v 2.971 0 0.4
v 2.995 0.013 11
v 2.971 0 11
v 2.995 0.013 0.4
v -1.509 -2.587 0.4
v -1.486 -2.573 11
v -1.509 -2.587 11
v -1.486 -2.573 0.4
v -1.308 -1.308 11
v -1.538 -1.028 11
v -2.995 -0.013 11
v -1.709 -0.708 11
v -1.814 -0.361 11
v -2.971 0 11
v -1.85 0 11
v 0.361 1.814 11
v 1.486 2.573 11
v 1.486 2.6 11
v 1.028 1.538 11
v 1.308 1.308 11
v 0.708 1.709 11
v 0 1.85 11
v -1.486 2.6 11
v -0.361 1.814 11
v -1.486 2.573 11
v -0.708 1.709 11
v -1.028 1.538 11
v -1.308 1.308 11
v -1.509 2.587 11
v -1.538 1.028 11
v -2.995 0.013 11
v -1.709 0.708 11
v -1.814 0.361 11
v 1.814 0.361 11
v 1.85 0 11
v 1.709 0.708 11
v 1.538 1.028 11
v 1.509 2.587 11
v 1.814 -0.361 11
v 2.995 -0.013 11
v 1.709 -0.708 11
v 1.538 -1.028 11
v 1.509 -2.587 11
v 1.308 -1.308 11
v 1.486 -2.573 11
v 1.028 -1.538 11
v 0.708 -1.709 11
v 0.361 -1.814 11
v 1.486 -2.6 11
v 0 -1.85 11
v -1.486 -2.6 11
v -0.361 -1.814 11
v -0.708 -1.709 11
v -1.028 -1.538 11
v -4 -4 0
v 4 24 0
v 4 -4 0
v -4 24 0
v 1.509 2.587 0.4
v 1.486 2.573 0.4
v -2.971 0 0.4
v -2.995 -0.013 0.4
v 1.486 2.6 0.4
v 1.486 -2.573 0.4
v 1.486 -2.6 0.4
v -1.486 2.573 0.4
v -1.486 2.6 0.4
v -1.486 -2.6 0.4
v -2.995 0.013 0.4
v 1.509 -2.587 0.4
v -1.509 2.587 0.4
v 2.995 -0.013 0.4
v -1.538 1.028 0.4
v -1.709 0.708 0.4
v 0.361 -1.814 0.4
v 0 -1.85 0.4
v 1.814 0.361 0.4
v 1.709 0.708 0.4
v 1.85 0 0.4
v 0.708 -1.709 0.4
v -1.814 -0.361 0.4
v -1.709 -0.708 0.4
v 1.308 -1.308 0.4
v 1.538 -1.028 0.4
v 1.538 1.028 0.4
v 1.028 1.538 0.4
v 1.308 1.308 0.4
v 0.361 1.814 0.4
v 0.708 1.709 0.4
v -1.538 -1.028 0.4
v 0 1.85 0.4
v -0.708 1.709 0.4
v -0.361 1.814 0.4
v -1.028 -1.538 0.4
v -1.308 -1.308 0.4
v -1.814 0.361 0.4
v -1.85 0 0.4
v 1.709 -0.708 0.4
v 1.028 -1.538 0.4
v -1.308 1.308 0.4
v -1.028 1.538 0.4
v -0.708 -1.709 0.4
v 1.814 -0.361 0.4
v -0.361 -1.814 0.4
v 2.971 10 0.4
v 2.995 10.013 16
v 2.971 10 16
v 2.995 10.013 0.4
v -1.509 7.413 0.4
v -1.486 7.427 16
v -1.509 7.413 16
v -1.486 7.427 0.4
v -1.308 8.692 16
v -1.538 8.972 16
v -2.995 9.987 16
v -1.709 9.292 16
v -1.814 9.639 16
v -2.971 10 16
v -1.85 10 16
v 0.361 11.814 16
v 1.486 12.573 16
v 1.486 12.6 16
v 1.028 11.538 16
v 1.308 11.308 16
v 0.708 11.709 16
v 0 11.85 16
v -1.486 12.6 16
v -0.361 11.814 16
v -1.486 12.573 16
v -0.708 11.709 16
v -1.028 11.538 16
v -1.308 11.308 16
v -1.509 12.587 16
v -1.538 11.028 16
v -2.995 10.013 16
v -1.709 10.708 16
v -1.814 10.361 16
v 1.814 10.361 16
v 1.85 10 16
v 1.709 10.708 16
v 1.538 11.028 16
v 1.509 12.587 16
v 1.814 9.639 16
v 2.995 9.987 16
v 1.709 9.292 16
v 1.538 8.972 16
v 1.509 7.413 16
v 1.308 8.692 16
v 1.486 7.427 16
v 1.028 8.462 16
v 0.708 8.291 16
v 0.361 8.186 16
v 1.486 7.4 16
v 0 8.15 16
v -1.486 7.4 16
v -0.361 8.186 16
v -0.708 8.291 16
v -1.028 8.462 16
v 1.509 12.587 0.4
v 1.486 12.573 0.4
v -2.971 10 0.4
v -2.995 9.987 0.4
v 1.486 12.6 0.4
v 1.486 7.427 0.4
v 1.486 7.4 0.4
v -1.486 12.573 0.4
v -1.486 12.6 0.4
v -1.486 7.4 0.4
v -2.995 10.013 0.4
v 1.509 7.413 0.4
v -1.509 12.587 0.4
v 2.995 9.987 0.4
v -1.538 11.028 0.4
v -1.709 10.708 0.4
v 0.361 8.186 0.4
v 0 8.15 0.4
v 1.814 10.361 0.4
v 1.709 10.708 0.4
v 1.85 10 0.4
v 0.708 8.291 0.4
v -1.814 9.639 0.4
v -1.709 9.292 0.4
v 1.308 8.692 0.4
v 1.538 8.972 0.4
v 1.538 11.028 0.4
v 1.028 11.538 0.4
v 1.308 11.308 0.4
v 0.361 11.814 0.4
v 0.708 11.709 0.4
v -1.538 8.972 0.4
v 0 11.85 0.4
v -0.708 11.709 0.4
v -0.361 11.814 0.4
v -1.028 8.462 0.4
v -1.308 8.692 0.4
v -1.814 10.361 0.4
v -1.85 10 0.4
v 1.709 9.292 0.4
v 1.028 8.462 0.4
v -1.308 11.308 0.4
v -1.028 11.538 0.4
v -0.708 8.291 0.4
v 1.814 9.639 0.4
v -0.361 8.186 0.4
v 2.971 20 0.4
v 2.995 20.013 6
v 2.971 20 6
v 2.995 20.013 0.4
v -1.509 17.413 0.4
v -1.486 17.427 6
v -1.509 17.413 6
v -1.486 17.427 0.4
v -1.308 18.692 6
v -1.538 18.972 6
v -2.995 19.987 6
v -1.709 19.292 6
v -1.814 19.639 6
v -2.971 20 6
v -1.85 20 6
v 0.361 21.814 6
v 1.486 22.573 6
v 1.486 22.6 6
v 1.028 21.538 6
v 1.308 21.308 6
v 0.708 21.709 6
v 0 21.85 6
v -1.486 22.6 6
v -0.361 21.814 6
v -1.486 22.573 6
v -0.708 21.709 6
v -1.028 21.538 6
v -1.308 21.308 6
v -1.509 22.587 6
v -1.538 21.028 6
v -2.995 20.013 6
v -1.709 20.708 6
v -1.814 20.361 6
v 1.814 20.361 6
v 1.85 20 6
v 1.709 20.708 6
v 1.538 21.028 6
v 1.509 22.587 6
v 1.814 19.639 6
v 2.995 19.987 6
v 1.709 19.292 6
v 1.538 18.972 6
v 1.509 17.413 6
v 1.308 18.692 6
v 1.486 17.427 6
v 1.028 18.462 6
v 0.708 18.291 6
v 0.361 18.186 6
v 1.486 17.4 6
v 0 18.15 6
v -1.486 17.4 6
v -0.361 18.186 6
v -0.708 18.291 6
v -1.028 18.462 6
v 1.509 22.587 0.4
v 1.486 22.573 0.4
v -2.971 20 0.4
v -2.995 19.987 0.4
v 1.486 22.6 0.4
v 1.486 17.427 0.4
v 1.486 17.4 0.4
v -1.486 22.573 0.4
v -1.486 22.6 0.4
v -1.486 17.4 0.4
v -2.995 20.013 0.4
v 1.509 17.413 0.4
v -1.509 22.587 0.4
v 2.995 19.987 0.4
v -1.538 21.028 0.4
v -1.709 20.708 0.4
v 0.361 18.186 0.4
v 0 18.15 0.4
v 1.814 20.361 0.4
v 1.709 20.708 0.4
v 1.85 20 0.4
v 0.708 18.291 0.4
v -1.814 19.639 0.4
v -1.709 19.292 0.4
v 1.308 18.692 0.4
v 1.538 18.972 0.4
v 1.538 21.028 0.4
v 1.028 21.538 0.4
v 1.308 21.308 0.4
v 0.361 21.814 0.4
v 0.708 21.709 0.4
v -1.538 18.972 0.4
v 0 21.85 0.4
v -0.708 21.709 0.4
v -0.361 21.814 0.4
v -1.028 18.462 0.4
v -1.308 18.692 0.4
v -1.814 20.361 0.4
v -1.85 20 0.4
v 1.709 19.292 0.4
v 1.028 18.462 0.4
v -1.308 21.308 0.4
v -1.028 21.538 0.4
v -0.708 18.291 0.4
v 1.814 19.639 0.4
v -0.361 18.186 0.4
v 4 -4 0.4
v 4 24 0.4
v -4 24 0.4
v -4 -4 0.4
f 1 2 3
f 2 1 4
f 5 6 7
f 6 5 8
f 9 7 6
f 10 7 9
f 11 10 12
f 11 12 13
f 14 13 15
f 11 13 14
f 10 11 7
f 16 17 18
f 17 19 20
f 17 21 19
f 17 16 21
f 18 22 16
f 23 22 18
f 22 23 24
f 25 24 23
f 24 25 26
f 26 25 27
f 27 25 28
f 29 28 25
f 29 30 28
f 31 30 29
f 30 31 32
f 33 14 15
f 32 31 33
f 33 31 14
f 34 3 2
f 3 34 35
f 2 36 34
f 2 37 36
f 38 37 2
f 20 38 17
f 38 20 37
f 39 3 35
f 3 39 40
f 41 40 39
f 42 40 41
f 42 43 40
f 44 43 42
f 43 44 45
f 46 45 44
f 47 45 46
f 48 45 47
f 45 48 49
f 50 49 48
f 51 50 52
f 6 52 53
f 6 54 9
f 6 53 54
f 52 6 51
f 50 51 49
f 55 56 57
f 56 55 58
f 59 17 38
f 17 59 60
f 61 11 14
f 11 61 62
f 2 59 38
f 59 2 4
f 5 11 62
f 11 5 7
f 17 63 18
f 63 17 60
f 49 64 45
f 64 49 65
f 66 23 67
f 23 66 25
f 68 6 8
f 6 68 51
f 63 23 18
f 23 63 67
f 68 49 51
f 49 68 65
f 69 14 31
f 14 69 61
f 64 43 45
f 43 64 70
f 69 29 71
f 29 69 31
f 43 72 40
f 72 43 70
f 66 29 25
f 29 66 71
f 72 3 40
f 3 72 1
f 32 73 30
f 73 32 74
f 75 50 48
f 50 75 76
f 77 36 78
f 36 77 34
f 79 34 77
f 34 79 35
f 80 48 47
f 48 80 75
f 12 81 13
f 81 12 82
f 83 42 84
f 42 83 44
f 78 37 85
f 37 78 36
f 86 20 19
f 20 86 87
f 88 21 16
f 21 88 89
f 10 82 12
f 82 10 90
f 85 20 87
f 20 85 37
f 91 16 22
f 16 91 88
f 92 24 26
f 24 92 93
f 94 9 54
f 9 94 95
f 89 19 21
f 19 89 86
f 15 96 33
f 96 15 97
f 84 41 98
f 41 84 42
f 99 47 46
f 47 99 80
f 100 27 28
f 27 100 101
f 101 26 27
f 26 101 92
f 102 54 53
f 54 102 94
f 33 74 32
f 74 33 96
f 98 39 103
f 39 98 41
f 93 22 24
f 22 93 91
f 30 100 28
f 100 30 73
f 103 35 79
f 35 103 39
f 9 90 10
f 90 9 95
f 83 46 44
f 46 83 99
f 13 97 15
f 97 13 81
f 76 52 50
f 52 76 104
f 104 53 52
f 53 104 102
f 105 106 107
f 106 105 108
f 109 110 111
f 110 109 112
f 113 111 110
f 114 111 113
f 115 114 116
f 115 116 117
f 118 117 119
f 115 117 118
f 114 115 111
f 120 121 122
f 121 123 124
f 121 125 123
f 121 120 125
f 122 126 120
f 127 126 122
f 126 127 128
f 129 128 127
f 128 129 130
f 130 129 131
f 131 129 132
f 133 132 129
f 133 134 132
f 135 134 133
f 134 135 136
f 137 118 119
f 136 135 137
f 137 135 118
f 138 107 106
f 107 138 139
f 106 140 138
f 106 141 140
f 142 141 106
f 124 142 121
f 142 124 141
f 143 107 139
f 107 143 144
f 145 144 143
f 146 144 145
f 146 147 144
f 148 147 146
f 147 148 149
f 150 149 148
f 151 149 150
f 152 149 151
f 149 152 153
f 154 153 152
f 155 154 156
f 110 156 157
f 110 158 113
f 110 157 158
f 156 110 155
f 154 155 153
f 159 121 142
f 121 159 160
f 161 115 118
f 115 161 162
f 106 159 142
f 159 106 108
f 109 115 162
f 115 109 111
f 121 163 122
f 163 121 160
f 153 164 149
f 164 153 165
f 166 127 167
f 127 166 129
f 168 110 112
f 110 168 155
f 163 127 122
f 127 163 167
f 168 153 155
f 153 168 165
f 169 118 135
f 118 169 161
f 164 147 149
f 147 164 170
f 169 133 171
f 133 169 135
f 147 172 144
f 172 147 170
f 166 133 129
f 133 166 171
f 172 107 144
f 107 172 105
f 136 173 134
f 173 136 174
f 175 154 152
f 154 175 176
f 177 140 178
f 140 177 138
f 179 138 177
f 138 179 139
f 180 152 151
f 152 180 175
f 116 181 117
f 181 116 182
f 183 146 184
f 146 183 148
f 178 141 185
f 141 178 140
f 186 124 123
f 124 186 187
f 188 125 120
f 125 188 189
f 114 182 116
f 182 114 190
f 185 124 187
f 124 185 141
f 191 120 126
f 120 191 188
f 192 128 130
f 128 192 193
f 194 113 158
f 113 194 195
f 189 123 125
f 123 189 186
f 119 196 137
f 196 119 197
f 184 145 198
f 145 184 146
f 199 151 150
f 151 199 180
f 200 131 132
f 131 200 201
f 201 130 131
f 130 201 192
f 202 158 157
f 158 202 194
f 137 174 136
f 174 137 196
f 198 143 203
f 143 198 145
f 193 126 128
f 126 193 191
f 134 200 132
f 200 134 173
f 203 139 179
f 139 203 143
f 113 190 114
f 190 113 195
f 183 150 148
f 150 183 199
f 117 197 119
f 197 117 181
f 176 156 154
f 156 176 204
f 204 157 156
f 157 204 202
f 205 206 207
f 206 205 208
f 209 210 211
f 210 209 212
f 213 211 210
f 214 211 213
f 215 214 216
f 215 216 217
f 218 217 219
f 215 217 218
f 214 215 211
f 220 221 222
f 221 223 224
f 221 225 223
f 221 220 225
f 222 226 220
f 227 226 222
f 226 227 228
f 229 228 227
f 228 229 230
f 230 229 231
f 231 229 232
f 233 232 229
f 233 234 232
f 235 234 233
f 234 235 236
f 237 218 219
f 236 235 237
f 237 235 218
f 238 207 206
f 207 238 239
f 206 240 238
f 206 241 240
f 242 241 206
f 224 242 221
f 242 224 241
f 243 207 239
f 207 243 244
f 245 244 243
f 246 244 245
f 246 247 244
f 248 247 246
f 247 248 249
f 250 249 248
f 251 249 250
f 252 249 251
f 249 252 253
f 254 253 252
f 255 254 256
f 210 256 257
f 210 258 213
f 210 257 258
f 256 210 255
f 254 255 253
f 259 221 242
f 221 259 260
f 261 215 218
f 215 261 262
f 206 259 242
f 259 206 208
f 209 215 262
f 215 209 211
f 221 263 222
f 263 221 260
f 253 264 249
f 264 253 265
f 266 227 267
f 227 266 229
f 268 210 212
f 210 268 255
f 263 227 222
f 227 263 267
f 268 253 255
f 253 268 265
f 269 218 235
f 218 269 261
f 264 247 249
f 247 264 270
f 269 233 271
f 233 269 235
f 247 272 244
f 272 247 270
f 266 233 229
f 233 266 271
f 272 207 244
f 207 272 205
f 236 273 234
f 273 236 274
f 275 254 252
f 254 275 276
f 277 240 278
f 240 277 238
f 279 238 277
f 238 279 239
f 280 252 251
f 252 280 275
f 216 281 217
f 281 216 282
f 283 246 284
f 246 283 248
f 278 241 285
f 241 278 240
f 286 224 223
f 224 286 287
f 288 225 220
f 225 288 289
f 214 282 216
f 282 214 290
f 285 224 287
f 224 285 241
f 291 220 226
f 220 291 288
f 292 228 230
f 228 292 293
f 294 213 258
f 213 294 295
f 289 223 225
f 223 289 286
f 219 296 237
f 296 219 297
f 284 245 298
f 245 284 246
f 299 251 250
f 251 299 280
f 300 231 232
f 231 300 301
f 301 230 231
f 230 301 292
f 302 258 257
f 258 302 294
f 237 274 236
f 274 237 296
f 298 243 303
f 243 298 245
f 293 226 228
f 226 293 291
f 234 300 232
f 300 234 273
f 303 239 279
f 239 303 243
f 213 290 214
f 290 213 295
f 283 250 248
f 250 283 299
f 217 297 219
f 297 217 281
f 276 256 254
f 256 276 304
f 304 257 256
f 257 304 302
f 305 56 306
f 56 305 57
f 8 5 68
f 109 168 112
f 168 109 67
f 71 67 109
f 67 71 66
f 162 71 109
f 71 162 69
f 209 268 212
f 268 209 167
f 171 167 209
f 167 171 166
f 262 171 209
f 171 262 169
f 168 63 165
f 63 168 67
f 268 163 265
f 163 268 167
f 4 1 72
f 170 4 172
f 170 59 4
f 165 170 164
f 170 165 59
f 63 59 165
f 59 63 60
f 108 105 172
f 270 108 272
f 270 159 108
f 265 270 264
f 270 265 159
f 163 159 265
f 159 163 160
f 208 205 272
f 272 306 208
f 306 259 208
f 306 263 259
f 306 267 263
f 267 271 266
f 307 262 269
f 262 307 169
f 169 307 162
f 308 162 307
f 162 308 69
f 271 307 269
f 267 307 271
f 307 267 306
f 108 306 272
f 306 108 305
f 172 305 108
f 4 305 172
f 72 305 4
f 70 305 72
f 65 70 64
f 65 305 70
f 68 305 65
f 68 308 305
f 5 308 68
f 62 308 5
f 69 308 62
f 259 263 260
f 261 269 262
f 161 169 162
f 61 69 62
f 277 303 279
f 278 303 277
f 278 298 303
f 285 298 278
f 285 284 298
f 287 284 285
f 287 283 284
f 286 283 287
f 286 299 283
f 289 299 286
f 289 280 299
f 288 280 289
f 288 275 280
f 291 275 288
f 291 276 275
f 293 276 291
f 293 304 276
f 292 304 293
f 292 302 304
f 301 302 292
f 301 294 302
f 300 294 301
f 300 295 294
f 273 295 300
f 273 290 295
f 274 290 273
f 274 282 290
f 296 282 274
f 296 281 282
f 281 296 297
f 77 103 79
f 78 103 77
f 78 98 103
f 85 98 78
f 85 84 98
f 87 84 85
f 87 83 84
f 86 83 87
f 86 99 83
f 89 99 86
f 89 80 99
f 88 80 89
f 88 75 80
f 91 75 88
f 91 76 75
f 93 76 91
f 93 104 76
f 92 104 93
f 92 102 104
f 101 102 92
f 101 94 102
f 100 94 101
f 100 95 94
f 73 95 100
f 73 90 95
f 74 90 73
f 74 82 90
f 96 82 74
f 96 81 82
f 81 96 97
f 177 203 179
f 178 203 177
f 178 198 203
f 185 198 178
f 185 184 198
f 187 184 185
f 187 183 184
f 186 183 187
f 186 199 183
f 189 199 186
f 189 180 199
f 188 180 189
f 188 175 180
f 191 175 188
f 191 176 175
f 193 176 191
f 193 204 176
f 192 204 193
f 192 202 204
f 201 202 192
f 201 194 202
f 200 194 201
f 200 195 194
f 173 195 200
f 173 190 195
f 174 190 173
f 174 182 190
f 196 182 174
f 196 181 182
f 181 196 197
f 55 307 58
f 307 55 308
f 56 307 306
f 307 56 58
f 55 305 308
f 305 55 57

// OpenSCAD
//Hexagon from http://svn.clifford.at/openscad/trunk/libraries/shapes.scad
// size is the XY plane size, height in Z
module hexagon(size, height) {
  boxWidth = size/1.75;
  for (r = [-60, 0, 60]) rotate([0,0,r]) cube([boxWidth, size, height], true);
}

module spacer(size, height,hole) {
	difference() {
		hexagon(size,height);
		translate([0,0,-height/2-1])	
			cylinder(d=hole,height+2,centre=true,$fn=32);	
	}
}

translate([-4,-4,0])	
	cube([8,28,0.4]);
translate([-1.5,12.5,0])	
	cube([3,5.5,0.3]);
translate([0,0,5.5])	
	spacer(5.2,11,3.7);
translate([0,10,8])	
	spacer(5.2,16,3.7);
translate([0,20,3])	
	spacer(5.2,6,3.7);
